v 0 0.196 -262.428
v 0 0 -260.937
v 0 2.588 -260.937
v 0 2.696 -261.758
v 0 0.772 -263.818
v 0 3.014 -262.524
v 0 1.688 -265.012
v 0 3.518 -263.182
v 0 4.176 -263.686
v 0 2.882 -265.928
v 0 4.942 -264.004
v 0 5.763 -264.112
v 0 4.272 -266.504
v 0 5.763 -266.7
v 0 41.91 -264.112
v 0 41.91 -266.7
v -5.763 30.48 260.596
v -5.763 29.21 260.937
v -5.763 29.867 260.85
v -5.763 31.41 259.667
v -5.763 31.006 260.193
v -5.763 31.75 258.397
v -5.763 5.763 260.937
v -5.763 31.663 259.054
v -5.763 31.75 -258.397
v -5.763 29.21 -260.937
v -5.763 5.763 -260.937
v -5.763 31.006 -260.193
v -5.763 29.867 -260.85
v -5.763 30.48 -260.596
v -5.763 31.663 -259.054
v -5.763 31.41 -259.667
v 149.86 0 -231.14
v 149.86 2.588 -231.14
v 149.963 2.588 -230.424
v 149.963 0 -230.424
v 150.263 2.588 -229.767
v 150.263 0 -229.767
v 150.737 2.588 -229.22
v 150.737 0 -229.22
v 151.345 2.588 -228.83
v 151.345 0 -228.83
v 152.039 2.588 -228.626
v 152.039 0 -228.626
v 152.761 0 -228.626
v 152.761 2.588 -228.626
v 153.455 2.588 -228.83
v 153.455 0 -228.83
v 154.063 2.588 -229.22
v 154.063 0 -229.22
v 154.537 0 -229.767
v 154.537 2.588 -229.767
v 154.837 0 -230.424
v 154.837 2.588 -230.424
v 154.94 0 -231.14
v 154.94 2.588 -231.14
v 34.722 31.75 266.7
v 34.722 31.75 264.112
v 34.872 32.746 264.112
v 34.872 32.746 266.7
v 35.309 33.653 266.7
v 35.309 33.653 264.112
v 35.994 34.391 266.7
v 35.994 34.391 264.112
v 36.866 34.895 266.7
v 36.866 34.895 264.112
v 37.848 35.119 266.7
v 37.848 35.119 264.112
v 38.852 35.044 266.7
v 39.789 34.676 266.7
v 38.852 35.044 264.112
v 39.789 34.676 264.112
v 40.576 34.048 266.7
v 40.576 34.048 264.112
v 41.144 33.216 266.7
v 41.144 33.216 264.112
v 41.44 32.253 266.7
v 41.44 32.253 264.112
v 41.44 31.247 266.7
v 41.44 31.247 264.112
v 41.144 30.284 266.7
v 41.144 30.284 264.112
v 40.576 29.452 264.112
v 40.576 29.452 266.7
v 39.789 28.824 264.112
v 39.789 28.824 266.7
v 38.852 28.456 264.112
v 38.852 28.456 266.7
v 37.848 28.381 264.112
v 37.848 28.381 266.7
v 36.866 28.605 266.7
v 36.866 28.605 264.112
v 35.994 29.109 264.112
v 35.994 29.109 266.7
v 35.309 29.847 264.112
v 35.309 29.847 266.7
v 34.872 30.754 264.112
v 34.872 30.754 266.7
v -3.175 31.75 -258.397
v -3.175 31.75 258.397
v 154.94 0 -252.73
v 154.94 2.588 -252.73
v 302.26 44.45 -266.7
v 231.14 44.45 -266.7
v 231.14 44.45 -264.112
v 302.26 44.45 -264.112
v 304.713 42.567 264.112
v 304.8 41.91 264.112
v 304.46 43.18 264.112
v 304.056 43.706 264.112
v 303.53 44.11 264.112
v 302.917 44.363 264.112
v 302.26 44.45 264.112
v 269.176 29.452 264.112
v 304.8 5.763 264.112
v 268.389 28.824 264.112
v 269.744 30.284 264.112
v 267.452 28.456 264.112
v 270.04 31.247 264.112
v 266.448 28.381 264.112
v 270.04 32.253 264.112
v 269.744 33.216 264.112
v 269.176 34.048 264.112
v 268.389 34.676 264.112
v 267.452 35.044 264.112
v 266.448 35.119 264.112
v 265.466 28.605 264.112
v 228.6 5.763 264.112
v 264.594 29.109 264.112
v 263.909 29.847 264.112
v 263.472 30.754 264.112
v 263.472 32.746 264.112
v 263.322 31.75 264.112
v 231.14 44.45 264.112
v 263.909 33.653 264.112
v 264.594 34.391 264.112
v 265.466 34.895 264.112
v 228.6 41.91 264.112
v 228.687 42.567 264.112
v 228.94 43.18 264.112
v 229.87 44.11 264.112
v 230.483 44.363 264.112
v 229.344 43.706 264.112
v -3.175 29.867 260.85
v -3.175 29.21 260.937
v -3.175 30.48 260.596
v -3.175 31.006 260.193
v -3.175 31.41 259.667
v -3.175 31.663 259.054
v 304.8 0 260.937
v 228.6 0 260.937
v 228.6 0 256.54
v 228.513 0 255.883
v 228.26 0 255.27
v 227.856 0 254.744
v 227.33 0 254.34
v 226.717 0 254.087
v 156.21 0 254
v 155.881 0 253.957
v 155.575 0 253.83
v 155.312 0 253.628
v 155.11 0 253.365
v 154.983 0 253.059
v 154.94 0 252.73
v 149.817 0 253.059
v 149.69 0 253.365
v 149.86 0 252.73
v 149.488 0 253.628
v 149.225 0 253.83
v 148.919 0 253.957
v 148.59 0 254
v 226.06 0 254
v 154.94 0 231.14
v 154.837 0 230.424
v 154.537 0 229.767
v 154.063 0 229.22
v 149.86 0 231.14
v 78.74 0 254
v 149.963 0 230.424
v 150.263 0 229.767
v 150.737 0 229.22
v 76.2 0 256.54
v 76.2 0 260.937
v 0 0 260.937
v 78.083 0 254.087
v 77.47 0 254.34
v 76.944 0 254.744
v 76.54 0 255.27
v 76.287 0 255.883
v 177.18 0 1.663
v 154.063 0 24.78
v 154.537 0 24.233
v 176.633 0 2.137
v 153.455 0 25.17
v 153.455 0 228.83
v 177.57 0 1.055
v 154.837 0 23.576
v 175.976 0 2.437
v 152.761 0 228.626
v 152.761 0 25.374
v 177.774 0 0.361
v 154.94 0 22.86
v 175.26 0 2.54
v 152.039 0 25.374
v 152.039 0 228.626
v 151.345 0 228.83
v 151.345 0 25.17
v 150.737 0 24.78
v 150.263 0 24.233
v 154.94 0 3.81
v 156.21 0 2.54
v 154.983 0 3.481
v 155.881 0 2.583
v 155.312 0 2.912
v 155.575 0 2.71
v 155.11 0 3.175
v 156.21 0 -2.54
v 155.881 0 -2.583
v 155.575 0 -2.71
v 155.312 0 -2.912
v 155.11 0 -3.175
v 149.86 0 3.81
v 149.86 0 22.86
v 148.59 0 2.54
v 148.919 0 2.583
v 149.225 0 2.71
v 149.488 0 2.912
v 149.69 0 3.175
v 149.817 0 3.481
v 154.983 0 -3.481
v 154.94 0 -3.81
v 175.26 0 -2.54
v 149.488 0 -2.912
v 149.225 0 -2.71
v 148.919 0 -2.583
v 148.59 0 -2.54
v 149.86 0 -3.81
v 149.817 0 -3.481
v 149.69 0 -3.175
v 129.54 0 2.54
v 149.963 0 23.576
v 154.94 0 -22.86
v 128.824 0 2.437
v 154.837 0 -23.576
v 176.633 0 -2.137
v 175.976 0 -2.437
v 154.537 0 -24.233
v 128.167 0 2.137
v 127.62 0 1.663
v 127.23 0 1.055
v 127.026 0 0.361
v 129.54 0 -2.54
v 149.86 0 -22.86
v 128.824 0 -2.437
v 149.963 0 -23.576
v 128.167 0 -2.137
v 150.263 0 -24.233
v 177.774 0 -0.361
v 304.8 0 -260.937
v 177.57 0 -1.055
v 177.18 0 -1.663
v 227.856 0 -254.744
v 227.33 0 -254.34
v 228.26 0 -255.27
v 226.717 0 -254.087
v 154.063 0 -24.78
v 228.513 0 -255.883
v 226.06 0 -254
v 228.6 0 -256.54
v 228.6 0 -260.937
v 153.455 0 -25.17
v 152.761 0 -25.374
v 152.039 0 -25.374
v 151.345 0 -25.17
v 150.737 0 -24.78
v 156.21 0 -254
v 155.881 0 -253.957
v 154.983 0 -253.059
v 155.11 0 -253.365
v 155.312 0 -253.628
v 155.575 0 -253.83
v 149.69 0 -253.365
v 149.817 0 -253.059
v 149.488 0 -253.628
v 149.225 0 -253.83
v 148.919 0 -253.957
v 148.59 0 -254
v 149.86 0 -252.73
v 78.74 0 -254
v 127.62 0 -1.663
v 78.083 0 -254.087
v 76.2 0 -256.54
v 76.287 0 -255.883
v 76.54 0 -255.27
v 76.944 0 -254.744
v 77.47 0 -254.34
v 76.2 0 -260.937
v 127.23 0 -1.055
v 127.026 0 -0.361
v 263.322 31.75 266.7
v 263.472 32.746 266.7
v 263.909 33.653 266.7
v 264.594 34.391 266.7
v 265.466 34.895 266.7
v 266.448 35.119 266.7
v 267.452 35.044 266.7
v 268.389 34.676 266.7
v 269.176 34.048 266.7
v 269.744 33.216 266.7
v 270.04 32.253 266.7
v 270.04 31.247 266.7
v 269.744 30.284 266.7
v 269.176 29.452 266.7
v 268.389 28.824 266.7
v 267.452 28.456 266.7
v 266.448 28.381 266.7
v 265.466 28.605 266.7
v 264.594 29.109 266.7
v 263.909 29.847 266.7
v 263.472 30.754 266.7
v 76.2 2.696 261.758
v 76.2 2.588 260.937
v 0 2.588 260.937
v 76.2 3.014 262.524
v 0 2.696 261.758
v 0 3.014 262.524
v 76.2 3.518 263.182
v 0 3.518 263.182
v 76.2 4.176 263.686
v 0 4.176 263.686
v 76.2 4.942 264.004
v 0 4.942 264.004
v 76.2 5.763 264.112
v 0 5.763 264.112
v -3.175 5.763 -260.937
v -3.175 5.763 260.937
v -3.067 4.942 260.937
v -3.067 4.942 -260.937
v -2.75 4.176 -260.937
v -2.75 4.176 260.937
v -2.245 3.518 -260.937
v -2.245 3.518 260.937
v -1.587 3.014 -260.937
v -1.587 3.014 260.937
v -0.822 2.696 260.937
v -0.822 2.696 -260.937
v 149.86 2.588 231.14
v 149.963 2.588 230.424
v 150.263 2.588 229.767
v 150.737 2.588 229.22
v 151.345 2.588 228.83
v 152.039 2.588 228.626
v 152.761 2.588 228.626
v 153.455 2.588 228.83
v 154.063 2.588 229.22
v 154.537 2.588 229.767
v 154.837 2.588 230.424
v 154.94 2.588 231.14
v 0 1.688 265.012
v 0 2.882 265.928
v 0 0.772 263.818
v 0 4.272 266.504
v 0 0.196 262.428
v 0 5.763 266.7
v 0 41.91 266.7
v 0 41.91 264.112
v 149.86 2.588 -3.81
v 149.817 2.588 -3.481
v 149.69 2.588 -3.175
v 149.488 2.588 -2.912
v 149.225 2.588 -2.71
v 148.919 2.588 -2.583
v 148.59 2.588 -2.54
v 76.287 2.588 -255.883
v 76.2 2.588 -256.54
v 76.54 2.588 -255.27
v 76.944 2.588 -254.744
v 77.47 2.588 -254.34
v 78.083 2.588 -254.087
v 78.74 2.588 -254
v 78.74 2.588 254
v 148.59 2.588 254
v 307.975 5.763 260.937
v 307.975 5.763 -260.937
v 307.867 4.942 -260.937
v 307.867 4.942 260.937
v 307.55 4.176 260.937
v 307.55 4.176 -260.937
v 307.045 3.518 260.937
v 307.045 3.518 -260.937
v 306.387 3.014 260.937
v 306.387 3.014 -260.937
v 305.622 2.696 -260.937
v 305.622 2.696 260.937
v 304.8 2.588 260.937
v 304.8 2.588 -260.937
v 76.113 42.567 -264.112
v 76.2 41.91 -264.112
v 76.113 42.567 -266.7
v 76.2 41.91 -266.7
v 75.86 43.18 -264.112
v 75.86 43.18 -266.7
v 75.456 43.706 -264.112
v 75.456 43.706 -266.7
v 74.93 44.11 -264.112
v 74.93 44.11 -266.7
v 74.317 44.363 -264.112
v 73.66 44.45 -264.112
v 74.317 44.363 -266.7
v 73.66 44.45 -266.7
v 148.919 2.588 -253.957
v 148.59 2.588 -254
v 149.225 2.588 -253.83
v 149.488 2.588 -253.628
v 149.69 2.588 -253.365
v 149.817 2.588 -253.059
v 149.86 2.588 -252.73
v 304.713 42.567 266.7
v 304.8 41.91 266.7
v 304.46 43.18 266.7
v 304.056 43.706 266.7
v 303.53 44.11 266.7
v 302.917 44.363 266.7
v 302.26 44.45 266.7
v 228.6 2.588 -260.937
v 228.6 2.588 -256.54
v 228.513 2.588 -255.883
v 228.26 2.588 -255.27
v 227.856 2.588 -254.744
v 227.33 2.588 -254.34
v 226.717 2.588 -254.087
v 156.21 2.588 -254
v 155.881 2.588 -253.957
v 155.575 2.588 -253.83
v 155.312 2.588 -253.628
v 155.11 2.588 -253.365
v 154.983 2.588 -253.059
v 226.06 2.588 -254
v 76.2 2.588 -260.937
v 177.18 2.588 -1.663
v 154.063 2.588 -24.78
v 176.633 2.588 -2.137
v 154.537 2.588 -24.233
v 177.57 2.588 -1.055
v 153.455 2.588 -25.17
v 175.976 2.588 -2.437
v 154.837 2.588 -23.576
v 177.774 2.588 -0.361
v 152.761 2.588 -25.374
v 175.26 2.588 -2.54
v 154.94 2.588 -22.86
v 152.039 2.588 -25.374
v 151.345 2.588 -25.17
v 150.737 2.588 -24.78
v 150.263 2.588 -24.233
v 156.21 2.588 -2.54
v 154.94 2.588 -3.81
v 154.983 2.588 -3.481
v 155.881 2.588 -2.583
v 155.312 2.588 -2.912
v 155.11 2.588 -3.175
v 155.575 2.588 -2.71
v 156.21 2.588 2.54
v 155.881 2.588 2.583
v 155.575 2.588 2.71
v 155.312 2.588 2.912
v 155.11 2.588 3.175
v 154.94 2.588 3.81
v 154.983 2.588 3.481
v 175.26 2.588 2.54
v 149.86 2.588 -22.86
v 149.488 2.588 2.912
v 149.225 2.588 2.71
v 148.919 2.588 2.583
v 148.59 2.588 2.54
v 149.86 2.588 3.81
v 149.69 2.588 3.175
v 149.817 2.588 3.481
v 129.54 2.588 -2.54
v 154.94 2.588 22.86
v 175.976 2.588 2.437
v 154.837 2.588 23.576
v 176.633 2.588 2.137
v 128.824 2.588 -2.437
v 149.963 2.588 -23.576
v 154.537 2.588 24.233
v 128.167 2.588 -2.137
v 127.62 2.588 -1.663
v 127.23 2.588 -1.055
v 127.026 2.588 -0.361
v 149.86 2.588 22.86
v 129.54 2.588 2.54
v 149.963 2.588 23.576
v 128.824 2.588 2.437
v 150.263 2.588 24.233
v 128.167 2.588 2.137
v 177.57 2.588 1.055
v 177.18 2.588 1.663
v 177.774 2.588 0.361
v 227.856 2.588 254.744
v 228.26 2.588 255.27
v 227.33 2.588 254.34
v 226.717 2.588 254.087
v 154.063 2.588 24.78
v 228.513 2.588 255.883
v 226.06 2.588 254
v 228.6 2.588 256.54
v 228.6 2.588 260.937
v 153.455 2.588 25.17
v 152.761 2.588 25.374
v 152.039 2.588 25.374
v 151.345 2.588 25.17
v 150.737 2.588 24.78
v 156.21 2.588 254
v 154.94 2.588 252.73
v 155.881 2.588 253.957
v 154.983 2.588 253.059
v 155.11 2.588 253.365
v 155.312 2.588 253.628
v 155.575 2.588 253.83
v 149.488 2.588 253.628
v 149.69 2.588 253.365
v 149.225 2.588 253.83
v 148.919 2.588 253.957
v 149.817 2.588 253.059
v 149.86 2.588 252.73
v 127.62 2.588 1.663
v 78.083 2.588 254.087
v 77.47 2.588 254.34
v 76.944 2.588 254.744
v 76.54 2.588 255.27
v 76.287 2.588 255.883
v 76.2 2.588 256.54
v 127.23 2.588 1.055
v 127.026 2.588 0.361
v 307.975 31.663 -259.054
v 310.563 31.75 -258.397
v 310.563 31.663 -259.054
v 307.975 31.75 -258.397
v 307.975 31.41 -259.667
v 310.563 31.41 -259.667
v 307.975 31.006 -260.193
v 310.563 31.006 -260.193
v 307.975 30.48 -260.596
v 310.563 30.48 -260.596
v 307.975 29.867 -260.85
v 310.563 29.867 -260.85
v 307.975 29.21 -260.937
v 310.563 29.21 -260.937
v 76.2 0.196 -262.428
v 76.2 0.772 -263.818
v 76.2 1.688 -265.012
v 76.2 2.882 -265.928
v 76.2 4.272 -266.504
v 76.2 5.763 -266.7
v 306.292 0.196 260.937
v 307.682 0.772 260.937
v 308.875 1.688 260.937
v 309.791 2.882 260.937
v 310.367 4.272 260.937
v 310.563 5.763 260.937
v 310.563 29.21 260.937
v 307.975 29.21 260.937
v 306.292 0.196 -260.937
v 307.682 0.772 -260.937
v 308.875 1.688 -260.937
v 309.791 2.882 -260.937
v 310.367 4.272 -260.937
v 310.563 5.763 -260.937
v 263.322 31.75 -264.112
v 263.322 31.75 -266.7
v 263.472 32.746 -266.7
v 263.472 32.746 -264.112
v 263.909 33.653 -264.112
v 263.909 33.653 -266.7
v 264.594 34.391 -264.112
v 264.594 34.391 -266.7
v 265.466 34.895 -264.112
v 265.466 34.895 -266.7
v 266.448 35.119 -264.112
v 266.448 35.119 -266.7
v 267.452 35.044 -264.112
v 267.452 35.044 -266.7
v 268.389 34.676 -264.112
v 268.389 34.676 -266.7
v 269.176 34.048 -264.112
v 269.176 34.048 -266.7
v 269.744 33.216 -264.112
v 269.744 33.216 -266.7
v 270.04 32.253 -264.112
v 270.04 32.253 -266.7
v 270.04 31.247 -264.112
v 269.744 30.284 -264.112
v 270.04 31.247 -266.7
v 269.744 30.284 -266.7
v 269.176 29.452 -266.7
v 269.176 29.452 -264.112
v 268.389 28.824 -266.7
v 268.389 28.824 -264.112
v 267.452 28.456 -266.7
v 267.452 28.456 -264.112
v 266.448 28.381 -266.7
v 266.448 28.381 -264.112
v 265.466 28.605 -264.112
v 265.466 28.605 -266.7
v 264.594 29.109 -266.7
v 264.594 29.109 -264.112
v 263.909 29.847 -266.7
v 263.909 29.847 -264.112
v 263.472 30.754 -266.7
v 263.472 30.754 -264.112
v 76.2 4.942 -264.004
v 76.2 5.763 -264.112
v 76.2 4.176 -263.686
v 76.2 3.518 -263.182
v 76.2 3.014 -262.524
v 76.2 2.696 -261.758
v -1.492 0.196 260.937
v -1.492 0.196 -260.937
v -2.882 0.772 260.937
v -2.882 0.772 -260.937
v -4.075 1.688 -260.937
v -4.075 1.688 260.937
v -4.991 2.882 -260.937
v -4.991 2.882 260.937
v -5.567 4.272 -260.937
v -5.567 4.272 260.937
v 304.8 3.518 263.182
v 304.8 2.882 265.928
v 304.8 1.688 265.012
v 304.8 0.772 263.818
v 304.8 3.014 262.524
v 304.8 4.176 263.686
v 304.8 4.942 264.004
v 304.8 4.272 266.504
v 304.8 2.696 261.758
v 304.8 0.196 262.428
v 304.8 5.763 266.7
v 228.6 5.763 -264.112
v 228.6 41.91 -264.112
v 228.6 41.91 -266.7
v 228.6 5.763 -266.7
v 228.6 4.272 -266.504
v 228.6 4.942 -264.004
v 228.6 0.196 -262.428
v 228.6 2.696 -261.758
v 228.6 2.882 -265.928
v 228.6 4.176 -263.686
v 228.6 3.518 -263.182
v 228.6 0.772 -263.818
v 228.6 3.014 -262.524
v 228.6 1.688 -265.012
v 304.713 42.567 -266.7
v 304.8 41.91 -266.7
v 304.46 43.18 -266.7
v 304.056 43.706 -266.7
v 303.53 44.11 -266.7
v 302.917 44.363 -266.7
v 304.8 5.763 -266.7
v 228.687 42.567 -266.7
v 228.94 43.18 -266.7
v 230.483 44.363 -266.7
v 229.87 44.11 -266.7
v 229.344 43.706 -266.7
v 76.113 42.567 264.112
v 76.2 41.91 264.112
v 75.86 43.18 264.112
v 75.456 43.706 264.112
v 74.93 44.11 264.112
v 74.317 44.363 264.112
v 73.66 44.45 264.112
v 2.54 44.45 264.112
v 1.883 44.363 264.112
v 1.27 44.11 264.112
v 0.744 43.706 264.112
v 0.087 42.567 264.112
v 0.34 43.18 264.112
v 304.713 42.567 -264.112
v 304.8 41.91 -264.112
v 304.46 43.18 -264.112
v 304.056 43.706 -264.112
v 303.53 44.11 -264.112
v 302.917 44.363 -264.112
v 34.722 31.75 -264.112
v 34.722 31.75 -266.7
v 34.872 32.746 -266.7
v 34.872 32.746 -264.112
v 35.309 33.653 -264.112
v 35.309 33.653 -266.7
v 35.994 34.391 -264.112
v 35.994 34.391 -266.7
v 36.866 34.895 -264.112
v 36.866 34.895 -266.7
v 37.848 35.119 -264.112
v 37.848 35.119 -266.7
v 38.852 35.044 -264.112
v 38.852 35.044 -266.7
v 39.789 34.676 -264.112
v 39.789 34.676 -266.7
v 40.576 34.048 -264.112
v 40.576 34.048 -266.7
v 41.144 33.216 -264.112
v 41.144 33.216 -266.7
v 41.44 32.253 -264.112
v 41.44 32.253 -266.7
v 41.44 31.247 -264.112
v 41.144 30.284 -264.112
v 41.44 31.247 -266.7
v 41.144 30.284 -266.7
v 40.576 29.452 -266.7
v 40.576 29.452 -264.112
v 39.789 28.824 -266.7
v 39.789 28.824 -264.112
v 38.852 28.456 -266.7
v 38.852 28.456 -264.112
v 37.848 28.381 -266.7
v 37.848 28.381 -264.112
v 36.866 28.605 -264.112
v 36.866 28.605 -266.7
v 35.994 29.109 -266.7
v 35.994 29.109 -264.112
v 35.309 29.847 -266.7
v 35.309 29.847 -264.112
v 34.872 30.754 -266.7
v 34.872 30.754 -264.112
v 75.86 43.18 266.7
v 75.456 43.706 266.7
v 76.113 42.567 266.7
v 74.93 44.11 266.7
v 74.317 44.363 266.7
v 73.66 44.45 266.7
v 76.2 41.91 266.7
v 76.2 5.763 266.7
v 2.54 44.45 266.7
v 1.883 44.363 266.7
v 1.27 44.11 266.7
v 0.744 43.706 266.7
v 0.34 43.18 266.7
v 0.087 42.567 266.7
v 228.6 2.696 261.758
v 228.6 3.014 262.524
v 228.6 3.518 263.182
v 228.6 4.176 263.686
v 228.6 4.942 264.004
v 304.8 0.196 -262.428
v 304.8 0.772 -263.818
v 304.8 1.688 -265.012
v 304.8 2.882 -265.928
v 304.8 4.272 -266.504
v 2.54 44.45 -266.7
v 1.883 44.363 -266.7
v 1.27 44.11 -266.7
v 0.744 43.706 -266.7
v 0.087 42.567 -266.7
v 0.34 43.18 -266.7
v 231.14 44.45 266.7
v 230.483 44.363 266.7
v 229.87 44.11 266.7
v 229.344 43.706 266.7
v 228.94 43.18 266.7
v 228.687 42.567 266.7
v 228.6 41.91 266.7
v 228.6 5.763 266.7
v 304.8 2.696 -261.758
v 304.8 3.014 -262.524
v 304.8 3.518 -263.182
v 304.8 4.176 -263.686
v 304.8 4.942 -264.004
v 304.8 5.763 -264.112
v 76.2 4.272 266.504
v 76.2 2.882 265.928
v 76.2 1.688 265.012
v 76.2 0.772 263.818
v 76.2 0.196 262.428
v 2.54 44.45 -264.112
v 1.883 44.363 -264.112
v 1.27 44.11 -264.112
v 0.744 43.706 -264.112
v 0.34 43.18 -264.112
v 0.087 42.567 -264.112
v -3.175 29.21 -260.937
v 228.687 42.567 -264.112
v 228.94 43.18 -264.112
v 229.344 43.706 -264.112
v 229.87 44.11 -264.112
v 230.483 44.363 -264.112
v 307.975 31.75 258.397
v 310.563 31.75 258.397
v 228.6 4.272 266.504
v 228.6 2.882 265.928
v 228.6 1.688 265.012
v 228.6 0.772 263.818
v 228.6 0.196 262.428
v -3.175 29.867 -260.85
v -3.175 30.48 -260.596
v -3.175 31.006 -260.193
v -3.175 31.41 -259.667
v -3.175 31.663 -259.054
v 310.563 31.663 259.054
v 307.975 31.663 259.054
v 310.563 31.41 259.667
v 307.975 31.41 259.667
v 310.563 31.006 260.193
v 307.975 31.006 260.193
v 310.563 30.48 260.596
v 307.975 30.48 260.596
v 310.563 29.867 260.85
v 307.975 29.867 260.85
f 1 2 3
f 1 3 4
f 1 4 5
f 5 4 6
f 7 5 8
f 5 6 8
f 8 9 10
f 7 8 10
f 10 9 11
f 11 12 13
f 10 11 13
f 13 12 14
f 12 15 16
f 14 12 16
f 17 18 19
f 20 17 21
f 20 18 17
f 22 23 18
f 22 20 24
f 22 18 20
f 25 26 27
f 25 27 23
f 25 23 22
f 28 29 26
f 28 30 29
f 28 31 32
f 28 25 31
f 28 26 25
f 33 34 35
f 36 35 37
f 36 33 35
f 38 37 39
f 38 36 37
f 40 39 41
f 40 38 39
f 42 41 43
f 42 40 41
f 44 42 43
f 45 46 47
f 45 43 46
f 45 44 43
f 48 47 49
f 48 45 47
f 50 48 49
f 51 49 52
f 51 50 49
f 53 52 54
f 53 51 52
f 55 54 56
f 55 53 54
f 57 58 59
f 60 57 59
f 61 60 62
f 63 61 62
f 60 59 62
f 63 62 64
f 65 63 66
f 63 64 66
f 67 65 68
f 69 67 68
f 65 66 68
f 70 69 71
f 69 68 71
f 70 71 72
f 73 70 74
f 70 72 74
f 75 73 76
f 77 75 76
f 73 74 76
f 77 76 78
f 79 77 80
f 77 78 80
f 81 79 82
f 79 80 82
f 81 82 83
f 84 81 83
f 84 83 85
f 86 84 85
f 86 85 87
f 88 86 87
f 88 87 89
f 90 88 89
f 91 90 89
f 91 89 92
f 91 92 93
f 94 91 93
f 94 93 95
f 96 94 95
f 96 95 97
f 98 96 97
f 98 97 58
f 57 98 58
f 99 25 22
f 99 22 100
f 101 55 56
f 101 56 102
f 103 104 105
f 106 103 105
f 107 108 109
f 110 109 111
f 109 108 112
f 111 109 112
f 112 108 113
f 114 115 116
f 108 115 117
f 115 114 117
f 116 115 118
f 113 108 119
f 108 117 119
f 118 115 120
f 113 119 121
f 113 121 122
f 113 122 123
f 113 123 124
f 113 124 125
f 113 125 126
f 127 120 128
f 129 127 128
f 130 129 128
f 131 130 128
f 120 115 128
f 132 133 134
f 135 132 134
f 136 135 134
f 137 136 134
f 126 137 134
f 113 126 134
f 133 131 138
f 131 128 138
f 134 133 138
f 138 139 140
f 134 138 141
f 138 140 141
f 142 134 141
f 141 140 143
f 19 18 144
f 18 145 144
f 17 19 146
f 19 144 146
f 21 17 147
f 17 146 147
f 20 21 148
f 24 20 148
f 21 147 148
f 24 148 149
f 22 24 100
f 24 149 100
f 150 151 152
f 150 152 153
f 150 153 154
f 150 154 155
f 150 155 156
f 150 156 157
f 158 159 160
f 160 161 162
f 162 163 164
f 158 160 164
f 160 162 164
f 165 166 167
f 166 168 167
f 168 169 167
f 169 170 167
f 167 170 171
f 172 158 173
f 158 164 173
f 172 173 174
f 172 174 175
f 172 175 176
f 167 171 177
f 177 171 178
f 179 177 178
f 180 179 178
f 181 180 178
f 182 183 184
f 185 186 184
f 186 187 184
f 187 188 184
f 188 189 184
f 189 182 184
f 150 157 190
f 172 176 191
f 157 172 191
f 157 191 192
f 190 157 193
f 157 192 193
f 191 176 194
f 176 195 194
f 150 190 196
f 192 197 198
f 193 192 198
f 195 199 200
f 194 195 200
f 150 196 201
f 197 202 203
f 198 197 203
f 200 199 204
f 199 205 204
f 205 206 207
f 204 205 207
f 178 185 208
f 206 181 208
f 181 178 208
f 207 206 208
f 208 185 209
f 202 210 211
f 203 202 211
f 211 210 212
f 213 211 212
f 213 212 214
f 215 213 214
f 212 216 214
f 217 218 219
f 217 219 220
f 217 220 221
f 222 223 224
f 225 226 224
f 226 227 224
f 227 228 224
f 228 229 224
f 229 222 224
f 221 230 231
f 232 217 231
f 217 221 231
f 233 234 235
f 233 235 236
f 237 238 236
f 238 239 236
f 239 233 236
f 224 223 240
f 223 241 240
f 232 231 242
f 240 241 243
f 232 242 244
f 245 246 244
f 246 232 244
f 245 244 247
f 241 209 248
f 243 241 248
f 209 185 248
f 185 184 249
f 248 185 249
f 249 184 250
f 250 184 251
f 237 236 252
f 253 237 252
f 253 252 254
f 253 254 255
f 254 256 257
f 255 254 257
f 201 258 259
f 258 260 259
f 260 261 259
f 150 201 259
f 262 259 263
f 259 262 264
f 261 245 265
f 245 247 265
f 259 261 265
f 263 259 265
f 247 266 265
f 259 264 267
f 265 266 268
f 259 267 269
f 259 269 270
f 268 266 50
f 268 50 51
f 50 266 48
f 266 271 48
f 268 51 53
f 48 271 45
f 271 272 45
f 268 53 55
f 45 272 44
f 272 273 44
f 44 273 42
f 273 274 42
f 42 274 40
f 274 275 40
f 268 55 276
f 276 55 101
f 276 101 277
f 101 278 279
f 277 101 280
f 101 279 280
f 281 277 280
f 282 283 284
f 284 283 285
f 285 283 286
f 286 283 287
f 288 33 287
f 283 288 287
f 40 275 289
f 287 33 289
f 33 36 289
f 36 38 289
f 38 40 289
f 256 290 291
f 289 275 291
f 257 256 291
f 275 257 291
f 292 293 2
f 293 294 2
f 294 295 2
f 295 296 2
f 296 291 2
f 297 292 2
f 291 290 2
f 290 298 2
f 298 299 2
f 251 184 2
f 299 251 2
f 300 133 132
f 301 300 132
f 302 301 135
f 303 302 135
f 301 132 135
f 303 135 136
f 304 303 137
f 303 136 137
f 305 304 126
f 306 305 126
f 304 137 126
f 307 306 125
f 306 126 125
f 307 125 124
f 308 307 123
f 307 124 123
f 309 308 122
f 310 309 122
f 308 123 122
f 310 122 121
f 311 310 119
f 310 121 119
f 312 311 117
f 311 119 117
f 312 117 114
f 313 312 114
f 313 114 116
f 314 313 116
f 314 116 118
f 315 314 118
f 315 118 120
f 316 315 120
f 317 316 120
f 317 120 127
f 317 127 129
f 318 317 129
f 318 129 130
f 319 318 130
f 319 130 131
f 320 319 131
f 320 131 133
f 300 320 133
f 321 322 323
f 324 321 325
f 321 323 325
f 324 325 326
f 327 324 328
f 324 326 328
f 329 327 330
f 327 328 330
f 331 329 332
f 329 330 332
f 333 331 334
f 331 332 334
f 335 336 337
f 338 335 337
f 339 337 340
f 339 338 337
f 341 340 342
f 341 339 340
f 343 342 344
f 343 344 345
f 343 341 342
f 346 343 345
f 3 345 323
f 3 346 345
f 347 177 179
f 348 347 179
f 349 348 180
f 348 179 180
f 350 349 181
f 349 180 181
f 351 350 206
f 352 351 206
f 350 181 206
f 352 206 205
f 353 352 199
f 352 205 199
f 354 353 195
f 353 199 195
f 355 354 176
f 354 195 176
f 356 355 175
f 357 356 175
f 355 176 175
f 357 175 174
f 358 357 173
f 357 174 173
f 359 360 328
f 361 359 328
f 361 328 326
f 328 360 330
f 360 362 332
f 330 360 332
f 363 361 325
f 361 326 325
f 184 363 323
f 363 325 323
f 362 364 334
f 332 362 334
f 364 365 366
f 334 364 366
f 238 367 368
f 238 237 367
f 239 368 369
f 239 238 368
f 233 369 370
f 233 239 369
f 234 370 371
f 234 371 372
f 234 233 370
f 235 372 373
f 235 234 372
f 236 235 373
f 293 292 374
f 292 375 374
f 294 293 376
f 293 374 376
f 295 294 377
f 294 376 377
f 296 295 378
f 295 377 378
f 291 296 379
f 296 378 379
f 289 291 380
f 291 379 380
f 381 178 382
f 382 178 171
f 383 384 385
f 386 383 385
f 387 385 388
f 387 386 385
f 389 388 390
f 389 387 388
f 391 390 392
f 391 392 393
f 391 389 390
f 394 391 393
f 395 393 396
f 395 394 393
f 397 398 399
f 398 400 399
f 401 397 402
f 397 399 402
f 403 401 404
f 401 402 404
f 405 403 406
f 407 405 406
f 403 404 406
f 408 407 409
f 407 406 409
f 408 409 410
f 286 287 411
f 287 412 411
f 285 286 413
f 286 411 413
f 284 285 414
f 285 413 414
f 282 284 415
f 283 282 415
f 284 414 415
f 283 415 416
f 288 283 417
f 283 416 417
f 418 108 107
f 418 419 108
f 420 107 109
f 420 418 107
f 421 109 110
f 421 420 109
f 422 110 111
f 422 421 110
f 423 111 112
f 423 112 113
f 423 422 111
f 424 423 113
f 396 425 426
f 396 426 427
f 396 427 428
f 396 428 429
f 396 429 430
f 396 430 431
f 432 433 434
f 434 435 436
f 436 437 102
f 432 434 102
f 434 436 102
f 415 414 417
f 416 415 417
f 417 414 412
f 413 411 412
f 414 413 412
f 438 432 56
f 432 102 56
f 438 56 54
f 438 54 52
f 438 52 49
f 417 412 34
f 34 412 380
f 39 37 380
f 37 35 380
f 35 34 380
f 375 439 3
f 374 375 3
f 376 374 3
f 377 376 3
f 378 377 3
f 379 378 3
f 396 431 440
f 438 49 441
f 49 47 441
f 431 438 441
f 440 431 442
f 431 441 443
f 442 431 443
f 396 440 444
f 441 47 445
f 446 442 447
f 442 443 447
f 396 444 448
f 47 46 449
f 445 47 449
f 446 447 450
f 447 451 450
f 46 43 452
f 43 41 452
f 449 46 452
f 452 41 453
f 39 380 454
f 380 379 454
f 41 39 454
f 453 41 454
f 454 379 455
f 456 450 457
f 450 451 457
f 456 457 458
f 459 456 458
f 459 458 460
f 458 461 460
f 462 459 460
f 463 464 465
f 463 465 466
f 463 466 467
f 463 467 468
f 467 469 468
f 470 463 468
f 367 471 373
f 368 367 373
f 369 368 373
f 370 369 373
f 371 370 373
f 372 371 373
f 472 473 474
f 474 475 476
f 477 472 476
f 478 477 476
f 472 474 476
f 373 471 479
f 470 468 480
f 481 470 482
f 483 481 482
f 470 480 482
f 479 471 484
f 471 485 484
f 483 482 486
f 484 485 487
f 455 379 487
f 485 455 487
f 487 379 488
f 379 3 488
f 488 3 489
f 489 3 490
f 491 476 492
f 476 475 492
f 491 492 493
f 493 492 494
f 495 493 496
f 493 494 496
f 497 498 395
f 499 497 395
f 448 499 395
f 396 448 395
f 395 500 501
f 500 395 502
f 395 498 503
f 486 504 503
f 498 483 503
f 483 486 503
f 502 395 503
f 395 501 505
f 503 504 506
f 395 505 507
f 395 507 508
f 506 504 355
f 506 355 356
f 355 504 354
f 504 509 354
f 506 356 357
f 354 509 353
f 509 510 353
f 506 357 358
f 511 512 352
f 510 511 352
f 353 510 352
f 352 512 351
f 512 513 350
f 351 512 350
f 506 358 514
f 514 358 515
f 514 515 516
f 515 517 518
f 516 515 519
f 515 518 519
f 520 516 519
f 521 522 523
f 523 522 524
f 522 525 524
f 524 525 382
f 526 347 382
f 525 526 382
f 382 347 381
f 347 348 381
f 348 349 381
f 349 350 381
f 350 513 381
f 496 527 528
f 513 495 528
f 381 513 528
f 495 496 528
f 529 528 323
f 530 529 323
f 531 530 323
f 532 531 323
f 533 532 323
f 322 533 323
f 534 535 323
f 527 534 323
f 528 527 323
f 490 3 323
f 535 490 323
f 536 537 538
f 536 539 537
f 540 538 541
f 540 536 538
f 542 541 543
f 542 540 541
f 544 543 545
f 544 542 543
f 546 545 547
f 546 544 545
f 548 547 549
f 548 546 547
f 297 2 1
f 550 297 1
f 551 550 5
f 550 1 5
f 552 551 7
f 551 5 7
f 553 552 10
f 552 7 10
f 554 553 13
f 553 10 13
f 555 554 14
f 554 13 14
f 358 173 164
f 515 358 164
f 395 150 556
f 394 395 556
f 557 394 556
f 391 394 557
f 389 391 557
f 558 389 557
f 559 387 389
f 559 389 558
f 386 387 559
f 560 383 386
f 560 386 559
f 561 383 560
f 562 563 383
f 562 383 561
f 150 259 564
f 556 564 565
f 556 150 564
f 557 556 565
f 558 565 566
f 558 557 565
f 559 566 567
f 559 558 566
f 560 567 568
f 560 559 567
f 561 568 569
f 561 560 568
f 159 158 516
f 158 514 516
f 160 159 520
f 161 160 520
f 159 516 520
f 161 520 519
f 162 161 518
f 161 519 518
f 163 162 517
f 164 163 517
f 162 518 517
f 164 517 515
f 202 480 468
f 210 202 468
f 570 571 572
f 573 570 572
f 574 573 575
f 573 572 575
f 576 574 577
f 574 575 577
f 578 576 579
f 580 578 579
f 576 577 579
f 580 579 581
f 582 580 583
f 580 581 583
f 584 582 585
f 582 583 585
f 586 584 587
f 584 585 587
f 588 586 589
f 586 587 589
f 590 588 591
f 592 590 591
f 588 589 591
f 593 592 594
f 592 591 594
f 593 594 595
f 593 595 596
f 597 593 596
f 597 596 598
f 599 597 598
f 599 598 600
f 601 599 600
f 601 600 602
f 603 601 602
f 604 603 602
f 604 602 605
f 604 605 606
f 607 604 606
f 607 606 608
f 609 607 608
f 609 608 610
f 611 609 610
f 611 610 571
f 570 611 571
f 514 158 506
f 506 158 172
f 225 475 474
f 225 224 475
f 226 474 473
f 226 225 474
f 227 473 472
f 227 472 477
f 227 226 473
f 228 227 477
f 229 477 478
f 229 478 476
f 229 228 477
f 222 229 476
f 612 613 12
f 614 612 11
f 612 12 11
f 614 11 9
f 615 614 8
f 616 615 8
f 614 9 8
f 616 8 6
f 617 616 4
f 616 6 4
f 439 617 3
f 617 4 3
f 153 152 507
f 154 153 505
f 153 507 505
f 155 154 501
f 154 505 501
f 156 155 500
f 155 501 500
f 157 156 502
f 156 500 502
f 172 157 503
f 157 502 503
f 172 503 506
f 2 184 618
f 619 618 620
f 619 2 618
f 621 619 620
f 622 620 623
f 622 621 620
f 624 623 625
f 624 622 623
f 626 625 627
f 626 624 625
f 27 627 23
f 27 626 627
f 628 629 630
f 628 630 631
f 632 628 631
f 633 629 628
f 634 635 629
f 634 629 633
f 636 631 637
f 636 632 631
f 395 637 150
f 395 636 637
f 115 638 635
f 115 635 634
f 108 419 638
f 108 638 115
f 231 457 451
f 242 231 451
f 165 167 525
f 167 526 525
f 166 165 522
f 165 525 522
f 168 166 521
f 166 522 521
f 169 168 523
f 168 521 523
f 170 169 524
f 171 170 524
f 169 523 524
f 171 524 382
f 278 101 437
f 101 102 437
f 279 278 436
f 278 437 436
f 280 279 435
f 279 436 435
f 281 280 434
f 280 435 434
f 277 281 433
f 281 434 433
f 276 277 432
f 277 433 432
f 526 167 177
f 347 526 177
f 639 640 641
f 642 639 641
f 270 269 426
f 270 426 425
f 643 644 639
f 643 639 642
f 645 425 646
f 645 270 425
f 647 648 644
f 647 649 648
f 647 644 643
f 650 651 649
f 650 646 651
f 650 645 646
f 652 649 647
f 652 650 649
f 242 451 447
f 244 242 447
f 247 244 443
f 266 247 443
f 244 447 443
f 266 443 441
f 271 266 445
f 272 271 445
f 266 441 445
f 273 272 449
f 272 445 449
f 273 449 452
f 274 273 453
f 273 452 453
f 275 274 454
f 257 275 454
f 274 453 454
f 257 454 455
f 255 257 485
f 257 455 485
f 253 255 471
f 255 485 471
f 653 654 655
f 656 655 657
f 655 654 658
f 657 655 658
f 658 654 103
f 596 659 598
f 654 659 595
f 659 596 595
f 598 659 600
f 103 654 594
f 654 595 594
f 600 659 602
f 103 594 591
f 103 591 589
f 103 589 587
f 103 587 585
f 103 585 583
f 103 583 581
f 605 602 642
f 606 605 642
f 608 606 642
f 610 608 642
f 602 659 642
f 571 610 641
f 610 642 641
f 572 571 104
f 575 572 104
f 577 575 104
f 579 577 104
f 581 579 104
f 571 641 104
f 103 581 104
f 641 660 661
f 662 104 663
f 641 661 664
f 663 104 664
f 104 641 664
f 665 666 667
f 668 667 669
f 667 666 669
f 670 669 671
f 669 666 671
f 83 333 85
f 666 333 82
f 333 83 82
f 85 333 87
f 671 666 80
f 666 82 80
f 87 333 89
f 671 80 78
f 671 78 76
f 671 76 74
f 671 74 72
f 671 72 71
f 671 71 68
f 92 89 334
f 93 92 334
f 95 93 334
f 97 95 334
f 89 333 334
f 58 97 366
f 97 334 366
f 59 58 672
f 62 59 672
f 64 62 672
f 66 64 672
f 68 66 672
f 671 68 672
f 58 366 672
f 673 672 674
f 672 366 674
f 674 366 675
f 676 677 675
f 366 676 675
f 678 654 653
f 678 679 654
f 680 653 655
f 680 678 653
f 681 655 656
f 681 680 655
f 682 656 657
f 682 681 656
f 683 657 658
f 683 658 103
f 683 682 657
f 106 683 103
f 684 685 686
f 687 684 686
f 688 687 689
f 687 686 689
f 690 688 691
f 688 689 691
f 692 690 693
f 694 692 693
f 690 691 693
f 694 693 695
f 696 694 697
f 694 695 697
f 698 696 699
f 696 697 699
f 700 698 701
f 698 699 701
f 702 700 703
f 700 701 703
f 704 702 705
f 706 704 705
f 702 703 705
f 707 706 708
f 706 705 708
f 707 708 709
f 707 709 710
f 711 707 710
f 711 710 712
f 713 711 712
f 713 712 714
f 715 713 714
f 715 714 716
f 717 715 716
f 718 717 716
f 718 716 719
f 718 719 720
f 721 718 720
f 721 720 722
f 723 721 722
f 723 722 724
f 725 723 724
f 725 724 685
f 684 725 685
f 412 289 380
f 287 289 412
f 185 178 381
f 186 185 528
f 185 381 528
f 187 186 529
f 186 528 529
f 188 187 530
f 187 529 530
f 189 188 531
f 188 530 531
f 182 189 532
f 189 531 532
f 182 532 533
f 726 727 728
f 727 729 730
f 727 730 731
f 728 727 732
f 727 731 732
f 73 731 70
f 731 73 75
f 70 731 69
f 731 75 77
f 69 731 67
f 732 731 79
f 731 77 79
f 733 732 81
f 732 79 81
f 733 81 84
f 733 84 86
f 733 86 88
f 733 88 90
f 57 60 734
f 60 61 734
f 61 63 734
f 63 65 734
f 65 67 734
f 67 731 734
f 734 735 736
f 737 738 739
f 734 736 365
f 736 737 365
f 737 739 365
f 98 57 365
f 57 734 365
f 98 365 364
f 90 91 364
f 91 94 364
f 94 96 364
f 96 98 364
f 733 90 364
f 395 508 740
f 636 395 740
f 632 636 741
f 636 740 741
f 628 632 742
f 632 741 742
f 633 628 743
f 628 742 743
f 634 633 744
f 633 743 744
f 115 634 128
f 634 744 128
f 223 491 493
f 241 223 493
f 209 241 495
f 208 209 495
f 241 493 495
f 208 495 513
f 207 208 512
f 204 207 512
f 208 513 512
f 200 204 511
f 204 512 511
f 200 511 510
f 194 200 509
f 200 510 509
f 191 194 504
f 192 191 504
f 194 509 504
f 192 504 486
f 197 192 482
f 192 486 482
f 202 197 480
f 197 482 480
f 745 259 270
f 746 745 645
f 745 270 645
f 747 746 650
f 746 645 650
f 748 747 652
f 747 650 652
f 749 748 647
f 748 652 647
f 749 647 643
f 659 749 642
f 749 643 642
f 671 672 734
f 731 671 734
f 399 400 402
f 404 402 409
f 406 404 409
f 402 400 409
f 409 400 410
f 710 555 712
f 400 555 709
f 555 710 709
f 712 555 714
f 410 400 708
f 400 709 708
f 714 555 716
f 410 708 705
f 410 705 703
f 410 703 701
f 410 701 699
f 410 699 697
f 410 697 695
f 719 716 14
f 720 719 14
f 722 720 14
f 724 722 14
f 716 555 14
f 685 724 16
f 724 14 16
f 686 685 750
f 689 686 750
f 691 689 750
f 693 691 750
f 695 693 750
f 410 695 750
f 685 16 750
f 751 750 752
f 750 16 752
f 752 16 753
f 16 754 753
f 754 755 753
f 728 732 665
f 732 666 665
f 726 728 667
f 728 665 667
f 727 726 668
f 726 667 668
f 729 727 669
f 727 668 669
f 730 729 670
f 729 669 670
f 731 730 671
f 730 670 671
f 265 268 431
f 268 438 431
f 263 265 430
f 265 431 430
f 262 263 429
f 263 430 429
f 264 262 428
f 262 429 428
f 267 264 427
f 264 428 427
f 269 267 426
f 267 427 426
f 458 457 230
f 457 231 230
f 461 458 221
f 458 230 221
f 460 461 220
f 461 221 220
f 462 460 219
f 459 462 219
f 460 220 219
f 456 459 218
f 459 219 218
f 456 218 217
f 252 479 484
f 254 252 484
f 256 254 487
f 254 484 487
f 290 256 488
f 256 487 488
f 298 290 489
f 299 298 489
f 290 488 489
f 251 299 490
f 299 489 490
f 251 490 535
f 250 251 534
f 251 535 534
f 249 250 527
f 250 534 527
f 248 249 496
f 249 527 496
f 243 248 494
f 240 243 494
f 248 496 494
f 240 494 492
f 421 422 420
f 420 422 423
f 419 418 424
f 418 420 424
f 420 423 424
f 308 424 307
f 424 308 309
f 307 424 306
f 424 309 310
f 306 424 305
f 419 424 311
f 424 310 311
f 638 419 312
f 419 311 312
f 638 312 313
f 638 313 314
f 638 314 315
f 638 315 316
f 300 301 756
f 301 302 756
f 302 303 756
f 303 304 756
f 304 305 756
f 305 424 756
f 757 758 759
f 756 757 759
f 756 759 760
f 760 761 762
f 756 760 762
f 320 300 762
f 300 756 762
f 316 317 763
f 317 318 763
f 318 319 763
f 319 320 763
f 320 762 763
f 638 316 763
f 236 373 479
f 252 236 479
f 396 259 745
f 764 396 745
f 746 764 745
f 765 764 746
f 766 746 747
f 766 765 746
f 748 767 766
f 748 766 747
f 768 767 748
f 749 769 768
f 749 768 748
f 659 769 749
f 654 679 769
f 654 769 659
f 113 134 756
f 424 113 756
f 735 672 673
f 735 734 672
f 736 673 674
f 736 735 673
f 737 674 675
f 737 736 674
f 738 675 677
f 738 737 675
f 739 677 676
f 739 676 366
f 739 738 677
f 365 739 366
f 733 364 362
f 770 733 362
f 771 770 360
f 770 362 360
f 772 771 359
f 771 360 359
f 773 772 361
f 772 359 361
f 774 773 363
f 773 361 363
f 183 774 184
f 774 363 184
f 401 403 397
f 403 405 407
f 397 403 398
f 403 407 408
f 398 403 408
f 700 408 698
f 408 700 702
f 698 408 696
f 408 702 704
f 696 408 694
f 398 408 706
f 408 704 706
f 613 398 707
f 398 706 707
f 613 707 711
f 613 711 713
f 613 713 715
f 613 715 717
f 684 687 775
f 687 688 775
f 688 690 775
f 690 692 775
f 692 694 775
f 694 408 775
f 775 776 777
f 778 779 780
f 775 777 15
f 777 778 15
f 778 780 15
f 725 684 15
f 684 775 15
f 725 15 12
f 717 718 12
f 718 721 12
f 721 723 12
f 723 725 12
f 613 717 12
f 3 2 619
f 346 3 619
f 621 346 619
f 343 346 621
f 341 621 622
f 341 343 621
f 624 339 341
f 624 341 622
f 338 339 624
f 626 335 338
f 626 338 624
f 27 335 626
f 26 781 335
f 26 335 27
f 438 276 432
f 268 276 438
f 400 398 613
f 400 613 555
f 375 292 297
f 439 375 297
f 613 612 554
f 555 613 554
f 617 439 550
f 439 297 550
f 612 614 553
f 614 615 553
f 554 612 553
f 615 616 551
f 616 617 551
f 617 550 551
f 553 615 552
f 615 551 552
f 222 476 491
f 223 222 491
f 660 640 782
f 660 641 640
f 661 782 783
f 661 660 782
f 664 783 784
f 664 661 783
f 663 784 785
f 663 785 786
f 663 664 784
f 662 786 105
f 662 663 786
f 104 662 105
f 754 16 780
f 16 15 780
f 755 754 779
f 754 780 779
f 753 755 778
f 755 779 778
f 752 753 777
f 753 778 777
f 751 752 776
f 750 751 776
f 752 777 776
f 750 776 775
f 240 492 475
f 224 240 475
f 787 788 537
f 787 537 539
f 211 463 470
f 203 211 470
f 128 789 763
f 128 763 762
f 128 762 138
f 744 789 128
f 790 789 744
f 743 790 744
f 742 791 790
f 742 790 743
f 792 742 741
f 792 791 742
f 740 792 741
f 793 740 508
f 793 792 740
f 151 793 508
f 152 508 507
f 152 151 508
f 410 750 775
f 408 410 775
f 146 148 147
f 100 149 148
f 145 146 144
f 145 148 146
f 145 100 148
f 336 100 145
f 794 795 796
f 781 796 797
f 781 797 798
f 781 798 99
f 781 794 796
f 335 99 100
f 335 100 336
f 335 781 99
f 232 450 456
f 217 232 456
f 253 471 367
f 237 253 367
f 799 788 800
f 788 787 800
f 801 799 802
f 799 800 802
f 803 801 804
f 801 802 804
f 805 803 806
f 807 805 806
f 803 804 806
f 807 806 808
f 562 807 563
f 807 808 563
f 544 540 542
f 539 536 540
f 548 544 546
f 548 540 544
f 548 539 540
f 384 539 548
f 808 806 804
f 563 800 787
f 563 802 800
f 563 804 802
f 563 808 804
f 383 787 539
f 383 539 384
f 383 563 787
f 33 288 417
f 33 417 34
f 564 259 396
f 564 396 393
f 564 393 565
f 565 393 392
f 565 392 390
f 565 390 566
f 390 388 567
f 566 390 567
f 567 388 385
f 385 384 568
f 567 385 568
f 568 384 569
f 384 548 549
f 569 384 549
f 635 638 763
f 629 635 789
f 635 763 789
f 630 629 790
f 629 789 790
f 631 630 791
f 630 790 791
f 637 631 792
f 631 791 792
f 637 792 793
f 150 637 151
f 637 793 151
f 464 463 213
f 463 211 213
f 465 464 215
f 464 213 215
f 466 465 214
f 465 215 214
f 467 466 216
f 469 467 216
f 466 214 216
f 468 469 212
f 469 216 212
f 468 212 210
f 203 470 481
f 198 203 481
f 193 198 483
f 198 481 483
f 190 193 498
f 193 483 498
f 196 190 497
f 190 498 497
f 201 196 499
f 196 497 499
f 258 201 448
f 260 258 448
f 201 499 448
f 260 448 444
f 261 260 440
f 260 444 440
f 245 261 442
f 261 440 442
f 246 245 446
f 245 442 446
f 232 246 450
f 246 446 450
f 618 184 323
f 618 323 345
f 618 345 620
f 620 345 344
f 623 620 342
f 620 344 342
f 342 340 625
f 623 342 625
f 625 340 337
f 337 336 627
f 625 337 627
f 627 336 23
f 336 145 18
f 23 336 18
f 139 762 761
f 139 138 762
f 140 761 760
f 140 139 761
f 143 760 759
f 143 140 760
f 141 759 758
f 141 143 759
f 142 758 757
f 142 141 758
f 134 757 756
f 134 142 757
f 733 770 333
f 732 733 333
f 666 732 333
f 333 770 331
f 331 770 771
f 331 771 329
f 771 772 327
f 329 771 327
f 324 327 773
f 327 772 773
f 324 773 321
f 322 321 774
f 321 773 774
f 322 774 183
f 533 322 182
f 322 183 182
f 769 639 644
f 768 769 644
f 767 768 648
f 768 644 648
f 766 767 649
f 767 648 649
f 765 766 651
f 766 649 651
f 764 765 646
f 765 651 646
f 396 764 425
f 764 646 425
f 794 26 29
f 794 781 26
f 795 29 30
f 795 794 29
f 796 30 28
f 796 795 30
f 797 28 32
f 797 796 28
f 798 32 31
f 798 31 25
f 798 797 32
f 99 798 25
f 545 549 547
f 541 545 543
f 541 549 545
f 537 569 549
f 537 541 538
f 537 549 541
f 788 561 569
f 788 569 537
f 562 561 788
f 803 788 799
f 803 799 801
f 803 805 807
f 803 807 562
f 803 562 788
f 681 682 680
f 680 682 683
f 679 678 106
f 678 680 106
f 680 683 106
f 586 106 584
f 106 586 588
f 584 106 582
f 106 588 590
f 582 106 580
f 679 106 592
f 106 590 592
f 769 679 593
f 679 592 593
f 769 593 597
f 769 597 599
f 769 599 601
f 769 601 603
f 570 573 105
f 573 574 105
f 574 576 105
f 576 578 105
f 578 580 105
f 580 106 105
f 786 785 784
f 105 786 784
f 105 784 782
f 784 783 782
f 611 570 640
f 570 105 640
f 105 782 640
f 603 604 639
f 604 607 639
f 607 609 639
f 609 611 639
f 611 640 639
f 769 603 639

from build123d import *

# Parameters (mm, degrees)
BASE_FLANGE1_DEPTH      = 304.8
CUT_EXTRUDE1_DEPTH      = 408.166225608
CUT_EXTRUDE1_DEPTH_BACK = 408.166225608
SKETCH6_W               = 152.4
SKETCH6_H               = 12.7
EDGE_FLANGE1_DEPTH      = 521.87348
EDGE_FLANGE1_BEND_DEPTH = 521.87348
F_1_4_CLEARANCE_HOLE1_D = 6.7564
FILLET1_R               = 2.54
CUT_EXTRUDE2_DEPTH      = 412.498279143
CUT_EXTRUDE3_DEPTH      = 412.769633365
FILLET2_R               = 1.27


# Sheet-metal steps are written as plain solids
with BuildPart() as part:
    # Sketch1 → Base-Flange1 (new body)
    with BuildSketch(Plane(origin=(0, 0, 0), x_dir=(0, 0, -1), z_dir=(1, 0, 0))):
        with BuildLine():
            Line((-266.7, 44.45), (-266.7, 5.76326))
            ThreePointArc((-266.7, 5.76326), (-265.011980228, 1.688019772), (-260.93674, 0))
            Line((-260.93674, 0), (260.93674, 0))
            ThreePointArc((260.93674, 0), (265.011980228, 1.688019772), (266.7, 5.76326))
            Line((266.7, 5.76326), (266.7, 44.45))
            Line((266.7, 44.45), (264.11174, 44.45))
            Line((264.11174, 44.45), (264.11174, 5.76326))
            ThreePointArc((264.11174, 5.76326), (263.18180403, 3.51819597), (260.93674, 2.58826))
            Line((260.93674, 2.58826), (-260.93674, 2.58826))
            ThreePointArc((-260.93674, 2.58826), (-263.18180403, 3.51819597), (-264.11174, 5.76326))
            Line((-264.11174, 5.76326), (-264.11174, 44.45))
            Line((-264.11174, 44.45), (-266.7, 44.45))
        make_face()
    extrude(amount=BASE_FLANGE1_DEPTH)

    # Sketch6 → Cut-Extrude1 (cut, two sides: drawn at the far end of the back side and taken through both)
    with BuildSketch(Plane(origin=(0, 2.58826, 0), x_dir=(1, 0, 0), z_dir=(0, 1, 0)).offset(-CUT_EXTRUDE1_DEPTH_BACK)):
        with Locations((152.4, 260.35)):
            Rectangle(SKETCH6_W, SKETCH6_H)
        with Locations((152.4, -260.35)):
            Rectangle(SKETCH6_W, SKETCH6_H)
    extrude(amount=CUT_EXTRUDE1_DEPTH + CUT_EXTRUDE1_DEPTH_BACK, mode=Mode.SUBTRACT)

    # Edge-Flange1 section (across the edge) → Edge-Flange1 (add)
    with BuildSketch(Plane(origin=(-3.175, 2.58826, -260.93674), x_dir=(1, 0, 0), z_dir=(0, 0, 1))):
        with BuildLine():
            Line((-2.58826, 3.175), (-2.58826, 29.16174))
            Line((-2.58826, 29.16174), (0, 29.16174))
            Line((0, 29.16174), (0, 3.175))
            ThreePointArc((0, 3.175), (0.92993597, 0.92993597), (3.175, 0))
            Line((3.175, 0), (3.175, -2.58826))
            ThreePointArc((3.175, -2.58826), (-0.900240228, -0.900240228), (-2.58826, 3.175))
        make_face()
    extrude(amount=EDGE_FLANGE1_DEPTH)

    # Edge-Flange1 section 2 (across the edge) → Edge-Flange1 bend (add)
    with BuildSketch(Plane(origin=(307.975, 2.58826, 260.93674), x_dir=(-1, 0, 0), z_dir=(0, 0, -1))):
        with BuildLine():
            Line((-2.58826, 3.175), (-2.58826, 29.16174))
            Line((-2.58826, 29.16174), (0, 29.16174))
            Line((0, 29.16174), (0, 3.175))
            ThreePointArc((0, 3.175), (0.92993597, 0.92993597), (3.175, 0))
            Line((3.175, 0), (3.175, -2.58826))
            ThreePointArc((3.175, -2.58826), (-0.900240228, -0.900240228), (-2.58826, 3.175))
        make_face()
    extrude(amount=EDGE_FLANGE1_BEND_DEPTH)

    # 1/4 Clearance Hole1 (through all)
    with Locations(Plane.XY.offset(266.7)):
        with Locations((38.1, 31.75), (266.7, 31.75)):
            Hole(F_1_4_CLEARANCE_HOLE1_D / 2)

    # Fillet1
    fillet1_edges = [part.edges().sort_by_distance(p)[0] for p in [
        (0, 44.45, 265.40587),
        (-4.46913, 31.75, -260.93674),
        (-4.46913, 31.75, 260.93674),
        (0, 44.45, -265.40587),
        (309.26913, 31.75, 260.93674),
        (309.26913, 31.75, -260.93674),
        (304.8, 44.45, 265.40587),
        (76.2, 1.29413, -254),
        (228.6, 1.29413, -254),
        (228.6, 44.45, -265.40587),
        (76.2, 44.45, -265.40587),
        (304.8, 44.45, -265.40587),
        (228.6, 1.29413, 254),
        (76.2, 1.29413, 254),
        (76.2, 44.45, 265.40587),
        (228.6, 44.45, 265.40587),
    ]]
    fillet(fillet1_edges, radius=FILLET1_R)

    # Sketch15 → Cut-Extrude2 (cut, through all)
    with BuildSketch(Plane(origin=(0, 2.58826, 0), x_dir=(1, 0, 0), z_dir=(0, 1, 0))):
        with BuildLine():
            Line((149.86, 22.86), (149.86, 2.54))
            Line((149.86, 2.54), (129.54, 2.54))
            ThreePointArc((129.54, 2.54), (127, 0), (129.54, -2.54))
            Line((129.54, -2.54), (149.86, -2.54))
            Line((149.86, -2.54), (149.86, -22.86))
            ThreePointArc((149.86, -22.86), (152.4, -25.4), (154.94, -22.86))
            Line((154.94, -22.86), (154.94, -2.54))
            Line((154.94, -2.54), (175.26, -2.54))
            ThreePointArc((175.26, -2.54), (177.8, 0), (175.26, 2.54))
            Line((175.26, 2.54), (154.94, 2.54))
            Line((154.94, 2.54), (154.94, 22.86))
            ThreePointArc((154.94, 22.86), (152.4, 25.4), (149.86, 22.86))
        make_face()
    extrude(amount=-CUT_EXTRUDE2_DEPTH, mode=Mode.SUBTRACT)

    # Sketch16 → Cut-Extrude3 (cut, through all)
    with BuildSketch(Plane.XZ):
        with BuildLine():
            Line((149.86, -254), (149.86, -231.14))
            ThreePointArc((149.86, -231.14), (152.4, -228.6), (154.94, -231.14))
            Line((154.94, -231.14), (154.94, -254))
            Line((154.94, -254), (149.86, -254))
        make_face()
        with BuildLine():
            Line((154.94, 254), (149.86, 254))
            Line((149.86, 254), (149.86, 231.14))
            ThreePointArc((149.86, 231.14), (152.4, 228.6), (154.94, 231.14))
            Line((154.94, 231.14), (154.94, 254))
        make_face()
    extrude(amount=-CUT_EXTRUDE3_DEPTH, mode=Mode.SUBTRACT)

    # Fillet2
    fillet2_edges = [part.edges().sort_by_distance(p)[0] for p in [
        (149.86, 1.29413, -2.54),
        (154.94, 1.29413, -2.54),
        (154.94, 1.29413, 2.54),
        (149.86, 1.29413, 2.54),
        (154.94, 1.29413, 254),
        (149.86, 1.29413, 254),
        (154.94, 1.29413, -254),
        (149.86, 1.29413, -254),
    ]]
    fillet(fillet2_edges, radius=FILLET2_R)


solid = part.part
